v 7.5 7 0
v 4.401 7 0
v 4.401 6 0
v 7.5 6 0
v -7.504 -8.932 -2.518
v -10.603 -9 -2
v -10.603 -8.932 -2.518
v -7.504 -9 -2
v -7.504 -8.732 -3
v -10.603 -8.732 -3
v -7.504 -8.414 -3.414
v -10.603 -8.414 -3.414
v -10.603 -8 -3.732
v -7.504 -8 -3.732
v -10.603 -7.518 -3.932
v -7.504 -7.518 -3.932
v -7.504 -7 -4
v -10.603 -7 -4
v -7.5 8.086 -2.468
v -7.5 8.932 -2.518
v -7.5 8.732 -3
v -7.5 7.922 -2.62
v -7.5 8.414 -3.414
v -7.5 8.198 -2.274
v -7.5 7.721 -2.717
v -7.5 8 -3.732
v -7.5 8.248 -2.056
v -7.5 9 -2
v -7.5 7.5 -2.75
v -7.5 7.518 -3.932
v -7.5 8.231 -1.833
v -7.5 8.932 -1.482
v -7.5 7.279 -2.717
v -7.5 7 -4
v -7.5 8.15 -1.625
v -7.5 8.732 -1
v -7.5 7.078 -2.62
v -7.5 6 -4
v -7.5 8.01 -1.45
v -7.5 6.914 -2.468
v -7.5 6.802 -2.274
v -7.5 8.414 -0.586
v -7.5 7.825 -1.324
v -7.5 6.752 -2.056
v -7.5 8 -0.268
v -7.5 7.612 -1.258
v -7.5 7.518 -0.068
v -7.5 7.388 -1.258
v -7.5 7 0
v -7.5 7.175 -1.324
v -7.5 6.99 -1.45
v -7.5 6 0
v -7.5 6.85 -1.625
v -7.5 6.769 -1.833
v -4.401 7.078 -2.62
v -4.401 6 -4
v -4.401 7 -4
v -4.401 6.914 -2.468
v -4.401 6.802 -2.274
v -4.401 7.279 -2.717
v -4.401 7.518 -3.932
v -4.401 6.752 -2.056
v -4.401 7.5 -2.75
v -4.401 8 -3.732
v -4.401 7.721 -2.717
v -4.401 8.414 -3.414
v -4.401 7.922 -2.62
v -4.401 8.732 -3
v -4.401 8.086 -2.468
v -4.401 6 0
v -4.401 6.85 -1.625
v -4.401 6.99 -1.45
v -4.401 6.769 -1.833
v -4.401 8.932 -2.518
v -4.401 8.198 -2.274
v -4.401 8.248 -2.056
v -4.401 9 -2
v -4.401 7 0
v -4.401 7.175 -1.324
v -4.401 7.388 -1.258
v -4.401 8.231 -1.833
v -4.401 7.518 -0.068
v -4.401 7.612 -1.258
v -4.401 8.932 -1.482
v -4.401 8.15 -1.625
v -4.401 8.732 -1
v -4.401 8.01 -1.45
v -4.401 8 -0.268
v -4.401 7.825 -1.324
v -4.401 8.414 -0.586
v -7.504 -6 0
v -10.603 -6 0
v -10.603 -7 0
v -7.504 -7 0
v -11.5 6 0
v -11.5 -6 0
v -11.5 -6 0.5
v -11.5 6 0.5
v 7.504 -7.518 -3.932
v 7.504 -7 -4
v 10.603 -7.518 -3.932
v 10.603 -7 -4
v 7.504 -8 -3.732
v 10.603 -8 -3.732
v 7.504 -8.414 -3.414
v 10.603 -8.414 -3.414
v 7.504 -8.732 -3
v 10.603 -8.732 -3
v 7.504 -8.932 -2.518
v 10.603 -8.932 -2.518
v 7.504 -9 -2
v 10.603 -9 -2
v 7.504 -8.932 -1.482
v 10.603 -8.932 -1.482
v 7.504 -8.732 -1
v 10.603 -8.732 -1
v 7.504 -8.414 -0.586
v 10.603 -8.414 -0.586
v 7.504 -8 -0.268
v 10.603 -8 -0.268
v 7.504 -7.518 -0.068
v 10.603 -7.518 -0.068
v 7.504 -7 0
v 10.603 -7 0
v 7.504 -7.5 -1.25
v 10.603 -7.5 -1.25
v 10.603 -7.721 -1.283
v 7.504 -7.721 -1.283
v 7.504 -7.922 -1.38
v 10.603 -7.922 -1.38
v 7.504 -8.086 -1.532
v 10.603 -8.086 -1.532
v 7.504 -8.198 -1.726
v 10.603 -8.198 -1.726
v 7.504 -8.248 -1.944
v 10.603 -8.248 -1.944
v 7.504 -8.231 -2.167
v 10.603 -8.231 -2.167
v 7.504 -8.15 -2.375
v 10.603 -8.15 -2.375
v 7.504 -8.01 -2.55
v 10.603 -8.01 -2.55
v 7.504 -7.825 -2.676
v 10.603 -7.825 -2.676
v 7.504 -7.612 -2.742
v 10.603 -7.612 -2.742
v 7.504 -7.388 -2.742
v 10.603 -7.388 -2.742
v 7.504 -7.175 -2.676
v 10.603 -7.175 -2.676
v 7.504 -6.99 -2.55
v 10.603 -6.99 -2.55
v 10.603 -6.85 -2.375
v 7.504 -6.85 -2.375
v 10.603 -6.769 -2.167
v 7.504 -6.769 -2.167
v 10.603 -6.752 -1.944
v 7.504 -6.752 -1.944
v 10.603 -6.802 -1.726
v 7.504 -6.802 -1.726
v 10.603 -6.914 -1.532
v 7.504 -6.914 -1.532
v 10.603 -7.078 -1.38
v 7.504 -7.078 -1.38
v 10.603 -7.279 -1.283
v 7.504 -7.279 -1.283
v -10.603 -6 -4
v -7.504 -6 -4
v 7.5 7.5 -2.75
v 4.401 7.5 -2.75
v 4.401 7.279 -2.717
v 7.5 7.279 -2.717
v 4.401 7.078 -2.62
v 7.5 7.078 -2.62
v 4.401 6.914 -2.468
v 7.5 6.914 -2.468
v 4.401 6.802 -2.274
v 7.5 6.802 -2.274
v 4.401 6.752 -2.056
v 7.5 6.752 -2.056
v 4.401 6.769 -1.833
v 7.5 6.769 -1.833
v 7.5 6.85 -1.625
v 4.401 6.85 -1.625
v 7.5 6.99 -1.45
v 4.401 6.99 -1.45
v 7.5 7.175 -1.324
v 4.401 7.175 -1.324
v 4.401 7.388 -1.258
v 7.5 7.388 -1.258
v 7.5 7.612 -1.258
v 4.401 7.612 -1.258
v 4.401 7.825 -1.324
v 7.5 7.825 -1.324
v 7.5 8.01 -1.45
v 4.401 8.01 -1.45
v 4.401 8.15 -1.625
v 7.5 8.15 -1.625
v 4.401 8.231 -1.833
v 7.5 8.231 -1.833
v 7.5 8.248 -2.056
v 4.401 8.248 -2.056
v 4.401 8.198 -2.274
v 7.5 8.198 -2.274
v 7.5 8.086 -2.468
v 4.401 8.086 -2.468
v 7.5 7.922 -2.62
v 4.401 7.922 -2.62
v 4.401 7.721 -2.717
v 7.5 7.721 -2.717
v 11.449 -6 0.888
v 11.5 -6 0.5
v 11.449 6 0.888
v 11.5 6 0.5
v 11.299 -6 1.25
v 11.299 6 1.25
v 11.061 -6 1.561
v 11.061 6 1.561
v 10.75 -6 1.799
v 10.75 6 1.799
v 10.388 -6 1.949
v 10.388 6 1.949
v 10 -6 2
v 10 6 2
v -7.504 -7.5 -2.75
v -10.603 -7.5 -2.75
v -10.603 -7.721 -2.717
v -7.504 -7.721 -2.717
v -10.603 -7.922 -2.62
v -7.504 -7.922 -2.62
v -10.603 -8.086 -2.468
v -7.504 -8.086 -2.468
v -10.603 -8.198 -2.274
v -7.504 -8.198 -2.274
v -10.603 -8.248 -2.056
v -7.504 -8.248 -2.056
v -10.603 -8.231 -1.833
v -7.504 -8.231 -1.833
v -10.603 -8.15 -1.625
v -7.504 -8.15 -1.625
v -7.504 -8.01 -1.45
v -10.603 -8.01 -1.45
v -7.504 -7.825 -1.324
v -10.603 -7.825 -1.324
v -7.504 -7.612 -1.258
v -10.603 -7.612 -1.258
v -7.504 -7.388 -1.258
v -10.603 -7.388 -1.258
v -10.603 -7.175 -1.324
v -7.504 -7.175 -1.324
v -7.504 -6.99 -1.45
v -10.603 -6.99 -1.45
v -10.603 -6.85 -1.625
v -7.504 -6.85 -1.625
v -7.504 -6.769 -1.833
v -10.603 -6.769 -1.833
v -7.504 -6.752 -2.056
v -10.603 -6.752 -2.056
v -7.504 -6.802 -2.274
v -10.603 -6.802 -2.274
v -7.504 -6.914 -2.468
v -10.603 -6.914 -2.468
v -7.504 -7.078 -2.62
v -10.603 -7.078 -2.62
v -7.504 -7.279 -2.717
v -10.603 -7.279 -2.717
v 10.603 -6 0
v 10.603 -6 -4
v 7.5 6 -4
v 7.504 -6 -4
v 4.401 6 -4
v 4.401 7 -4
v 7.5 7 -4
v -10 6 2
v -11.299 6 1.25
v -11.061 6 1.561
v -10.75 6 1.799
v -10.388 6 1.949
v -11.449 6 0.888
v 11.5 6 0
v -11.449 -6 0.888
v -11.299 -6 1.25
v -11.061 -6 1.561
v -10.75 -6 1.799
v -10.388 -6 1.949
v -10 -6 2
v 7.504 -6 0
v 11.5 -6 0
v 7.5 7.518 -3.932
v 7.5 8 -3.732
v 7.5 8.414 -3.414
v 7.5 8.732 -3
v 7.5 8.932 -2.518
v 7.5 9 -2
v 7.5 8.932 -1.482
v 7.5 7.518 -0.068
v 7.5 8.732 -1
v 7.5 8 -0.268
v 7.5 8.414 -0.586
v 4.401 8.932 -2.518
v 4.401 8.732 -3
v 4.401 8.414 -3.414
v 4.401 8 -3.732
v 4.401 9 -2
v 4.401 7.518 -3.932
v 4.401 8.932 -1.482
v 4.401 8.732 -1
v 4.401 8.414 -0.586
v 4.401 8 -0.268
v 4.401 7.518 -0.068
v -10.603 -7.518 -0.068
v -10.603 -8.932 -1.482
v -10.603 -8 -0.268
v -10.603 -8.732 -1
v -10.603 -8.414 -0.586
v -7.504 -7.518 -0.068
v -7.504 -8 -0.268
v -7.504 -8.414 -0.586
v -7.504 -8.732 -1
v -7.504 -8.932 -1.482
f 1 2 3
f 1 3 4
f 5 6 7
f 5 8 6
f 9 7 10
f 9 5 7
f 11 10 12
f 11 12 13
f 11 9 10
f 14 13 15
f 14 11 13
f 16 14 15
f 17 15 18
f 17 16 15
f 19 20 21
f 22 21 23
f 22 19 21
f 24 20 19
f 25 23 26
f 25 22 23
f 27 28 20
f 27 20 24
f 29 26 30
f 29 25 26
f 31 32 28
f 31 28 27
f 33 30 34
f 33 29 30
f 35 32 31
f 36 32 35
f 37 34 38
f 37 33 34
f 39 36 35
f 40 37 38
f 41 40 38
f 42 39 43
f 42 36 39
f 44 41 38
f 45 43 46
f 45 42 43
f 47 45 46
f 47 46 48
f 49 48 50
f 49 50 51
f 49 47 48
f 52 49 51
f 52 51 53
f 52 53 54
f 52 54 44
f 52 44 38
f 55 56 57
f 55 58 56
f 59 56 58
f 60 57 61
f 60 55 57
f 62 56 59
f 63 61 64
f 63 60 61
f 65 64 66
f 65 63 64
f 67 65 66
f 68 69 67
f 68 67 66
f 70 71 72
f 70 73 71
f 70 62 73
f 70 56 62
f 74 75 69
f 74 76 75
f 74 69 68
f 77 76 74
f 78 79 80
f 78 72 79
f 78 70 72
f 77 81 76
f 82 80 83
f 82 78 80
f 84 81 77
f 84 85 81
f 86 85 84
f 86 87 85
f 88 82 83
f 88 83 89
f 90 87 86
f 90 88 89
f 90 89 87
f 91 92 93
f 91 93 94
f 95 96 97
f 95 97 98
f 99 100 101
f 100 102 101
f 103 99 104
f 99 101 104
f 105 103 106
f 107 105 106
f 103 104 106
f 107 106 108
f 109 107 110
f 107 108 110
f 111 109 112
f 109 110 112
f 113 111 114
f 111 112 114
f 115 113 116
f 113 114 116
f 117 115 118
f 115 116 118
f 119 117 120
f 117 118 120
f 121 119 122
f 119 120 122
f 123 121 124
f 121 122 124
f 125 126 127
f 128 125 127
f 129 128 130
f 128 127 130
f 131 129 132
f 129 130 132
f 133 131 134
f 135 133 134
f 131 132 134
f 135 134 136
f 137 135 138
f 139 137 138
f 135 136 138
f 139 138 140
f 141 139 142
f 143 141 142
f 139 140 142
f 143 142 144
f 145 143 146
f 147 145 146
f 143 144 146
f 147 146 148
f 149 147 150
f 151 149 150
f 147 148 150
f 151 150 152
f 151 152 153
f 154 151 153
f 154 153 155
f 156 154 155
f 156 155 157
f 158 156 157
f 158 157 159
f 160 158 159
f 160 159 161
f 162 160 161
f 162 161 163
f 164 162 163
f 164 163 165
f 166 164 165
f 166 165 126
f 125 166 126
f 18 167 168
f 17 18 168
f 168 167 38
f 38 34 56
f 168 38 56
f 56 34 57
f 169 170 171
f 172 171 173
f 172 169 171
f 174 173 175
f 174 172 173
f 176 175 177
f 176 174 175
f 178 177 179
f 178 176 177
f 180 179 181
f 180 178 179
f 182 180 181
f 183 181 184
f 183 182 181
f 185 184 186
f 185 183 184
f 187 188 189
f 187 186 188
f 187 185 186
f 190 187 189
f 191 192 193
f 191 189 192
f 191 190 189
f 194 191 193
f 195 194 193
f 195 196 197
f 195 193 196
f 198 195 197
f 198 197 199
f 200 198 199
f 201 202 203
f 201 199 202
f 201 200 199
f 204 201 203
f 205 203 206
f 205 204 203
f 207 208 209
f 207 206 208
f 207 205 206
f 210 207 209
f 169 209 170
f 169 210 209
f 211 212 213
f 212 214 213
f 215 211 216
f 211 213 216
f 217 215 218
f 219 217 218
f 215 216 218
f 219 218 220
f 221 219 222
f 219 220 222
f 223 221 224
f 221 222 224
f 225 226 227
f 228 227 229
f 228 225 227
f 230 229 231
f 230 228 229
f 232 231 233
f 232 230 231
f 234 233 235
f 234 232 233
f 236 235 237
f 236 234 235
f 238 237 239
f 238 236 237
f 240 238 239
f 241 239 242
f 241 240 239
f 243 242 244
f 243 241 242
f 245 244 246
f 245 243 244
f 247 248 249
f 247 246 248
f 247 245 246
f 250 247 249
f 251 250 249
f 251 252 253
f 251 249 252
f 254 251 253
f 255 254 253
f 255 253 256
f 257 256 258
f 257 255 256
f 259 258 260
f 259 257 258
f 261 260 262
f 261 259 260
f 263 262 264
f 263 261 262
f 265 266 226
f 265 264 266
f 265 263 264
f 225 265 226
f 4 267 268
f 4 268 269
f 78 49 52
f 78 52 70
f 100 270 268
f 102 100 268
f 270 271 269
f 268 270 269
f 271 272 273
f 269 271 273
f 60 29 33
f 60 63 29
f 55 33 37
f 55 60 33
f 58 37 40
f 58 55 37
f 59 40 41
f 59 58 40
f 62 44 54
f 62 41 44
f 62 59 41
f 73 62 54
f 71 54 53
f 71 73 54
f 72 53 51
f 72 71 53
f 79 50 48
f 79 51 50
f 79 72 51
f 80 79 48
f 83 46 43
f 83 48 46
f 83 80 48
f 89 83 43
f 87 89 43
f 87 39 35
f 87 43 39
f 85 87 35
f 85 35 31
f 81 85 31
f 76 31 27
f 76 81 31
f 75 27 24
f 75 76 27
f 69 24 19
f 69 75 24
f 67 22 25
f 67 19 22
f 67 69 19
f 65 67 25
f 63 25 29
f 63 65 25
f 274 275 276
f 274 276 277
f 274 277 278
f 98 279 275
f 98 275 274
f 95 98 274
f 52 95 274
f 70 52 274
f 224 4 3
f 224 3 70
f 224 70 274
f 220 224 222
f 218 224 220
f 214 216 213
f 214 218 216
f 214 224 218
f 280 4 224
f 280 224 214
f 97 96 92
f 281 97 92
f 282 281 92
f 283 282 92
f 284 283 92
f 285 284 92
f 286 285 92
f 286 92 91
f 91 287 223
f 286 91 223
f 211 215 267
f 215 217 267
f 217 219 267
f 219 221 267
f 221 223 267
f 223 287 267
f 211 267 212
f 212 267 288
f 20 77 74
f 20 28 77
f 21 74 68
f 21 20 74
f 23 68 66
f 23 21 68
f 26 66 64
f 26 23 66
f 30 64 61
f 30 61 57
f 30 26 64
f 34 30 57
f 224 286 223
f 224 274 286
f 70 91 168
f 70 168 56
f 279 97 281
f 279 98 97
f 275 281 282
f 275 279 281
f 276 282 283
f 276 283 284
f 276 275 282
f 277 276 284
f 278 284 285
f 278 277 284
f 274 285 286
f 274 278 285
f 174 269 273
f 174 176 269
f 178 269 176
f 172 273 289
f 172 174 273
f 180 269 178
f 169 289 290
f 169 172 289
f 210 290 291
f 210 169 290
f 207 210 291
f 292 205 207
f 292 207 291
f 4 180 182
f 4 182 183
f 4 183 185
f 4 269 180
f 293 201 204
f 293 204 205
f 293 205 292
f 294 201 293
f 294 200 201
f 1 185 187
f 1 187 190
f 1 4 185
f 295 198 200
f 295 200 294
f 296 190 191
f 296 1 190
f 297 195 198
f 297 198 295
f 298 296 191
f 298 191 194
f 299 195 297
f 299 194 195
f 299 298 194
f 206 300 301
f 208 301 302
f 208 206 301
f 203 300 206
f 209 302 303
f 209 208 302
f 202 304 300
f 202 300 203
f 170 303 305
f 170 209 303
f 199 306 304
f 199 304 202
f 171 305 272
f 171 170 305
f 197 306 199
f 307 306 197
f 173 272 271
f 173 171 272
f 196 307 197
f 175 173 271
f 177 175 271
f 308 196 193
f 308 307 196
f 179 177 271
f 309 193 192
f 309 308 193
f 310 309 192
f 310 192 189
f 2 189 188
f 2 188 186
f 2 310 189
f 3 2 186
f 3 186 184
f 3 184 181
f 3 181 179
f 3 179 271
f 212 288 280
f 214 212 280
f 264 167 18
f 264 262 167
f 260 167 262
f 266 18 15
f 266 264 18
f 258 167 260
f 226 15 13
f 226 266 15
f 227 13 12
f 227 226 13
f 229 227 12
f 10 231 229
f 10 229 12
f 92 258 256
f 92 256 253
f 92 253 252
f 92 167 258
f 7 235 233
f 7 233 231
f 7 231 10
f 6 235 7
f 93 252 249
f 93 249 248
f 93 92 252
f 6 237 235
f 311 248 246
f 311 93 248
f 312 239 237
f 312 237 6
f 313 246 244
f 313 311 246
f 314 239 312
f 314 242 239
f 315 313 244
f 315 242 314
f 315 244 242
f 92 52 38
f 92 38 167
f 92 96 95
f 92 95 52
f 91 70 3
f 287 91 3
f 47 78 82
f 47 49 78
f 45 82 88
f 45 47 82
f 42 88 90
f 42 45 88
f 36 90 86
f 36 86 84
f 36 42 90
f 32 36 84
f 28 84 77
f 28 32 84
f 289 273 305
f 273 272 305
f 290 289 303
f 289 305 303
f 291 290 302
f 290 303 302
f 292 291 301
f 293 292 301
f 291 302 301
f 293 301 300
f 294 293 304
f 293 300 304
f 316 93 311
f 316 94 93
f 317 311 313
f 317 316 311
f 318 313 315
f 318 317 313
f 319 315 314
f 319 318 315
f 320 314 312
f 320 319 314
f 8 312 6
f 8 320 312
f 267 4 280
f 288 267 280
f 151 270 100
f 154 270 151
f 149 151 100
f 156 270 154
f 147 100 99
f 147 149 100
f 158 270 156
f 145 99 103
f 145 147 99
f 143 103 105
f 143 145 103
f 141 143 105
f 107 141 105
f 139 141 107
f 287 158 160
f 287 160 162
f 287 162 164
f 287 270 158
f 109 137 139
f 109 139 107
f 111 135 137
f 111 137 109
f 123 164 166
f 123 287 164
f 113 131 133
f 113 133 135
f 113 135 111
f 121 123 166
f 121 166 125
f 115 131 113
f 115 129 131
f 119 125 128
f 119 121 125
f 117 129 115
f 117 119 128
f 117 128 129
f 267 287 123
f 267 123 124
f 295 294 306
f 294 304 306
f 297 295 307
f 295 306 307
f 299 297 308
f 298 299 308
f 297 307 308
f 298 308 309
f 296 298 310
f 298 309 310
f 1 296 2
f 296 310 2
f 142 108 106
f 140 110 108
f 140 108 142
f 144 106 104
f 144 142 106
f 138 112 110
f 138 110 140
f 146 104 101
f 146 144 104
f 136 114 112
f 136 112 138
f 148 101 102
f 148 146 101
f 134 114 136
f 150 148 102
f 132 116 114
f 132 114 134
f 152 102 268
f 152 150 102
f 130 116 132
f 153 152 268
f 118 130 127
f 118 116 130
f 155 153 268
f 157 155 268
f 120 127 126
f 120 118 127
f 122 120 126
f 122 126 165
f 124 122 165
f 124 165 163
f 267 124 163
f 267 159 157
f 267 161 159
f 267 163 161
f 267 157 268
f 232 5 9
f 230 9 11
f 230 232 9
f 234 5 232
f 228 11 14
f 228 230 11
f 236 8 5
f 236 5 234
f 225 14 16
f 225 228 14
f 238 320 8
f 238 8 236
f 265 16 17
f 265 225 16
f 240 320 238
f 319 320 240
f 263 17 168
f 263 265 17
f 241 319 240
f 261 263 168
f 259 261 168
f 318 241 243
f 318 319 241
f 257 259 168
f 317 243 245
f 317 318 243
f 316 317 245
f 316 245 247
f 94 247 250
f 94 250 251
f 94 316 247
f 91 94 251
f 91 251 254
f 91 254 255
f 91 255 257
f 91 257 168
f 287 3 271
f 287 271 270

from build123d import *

# Parameters (mm, degrees)
SKETCH2_W                      = 23
SKETCH2_H                      = 12
BOSS_EXTRUDE2_DEPTH            = 2
FILLET3_R                      = 1.5
BOSS_EXTRUDE4_DEPTH            = 4
FILLET4_R                      = 2
F_1_5MM_DOWEL_HOLE1_AT_2_COUNT = 2
F_1_5MM_DOWEL_HOLE1_AT_2_PITCH = 15
F_1_5MM_DOWEL_HOLE2_D          = 1.5
F_1_5MM_DOWEL_HOLE2_DEPTH      = 29999.549354536
F_1_5MM_DOWEL_HOLE2_TIP        = 0.450645464


with BuildPart() as part:
    # Sketch2 → Boss-Extrude2 (new body)
    with BuildSketch(Plane.XY):
        Rectangle(SKETCH2_W, SKETCH2_H)
    extrude(amount=BOSS_EXTRUDE2_DEPTH)

    # Fillet3
    fillet3_edges = [part.edges().sort_by_distance(p)[0] for p in [
        (-11.5, 0, 2),
        (11.5, 0, 2),
    ]]
    fillet(fillet3_edges, radius=FILLET3_R)

    # Sketch3 → Boss-Extrude4 (add)
    with BuildSketch(Plane(origin=(0, 0, 0), x_dir=(-1, 0, 0), z_dir=(0, 0, -1))):
        Polygon((-10.602604408, -6), (-7.5, 6), (-7.5, 9), (-4.401349547, 9), (-4.401349547, 6), (-7.503953954, -6), (-7.503953954, -9), (-10.602604408, -9), align=None)
        Polygon((7.503953954, -6), (4.401349547, 6), (4.401349547, 9), (7.5, 9), (7.5, 6), (10.602604408, -6), (10.602604408, -9), (7.503953954, -9), align=None)
    extrude(amount=BOSS_EXTRUDE4_DEPTH)

    # Fillet4
    fillet4_edges = [part.edges().sort_by_distance(p)[0] for p in [
        (-9.053279181, -9, 0),
        (-9.053279181, -9, -4),
        (9.053279181, -9, 0),
        (9.053279181, -9, -4),
        (5.950674773, 9, 0),
        (5.950674773, 9, -4),
        (-5.950674773, 9, 0),
        (-5.950674773, 9, -4),
    ]]
    fillet(fillet4_edges, radius=FILLET4_R - 0.0001)  # a hair under: the kernel refuses the full size

    # Sketch9 → Ø1.5mm Dowel Hole1 (revolve, cut)
    with BuildSketch(Plane(origin=(7.5, 7.5, -2), x_dir=(0, 0, -1), z_dir=(0, 1, 0))):
        Polygon((0, 0), (0, 30000), (0.75, 29999.549354536), (0.75, 0), align=None)
    f_1_5mm_dowel_hole1 = revolve(axis=Axis((13.85, 7.5, -2), (-1, 0, 0)), mode=Mode.SUBTRACT)

    # Ø1.5mm Dowel Hole1 at 2: Ø1.5mm Dowel Hole1 ×2
    with Locations(*[(0, -i * F_1_5MM_DOWEL_HOLE1_AT_2_PITCH, 0) for i in range(1, F_1_5MM_DOWEL_HOLE1_AT_2_COUNT)]):
        add(f_1_5mm_dowel_hole1, mode=Mode.SUBTRACT)

    # Ø1.5mm Dowel Hole2
    with Locations(Plane(origin=(7.5, -7.5, -2), x_dir=(0, 0, -1), z_dir=(-1, 0, 0))):
        with Locations((0, 0)):
            Hole(F_1_5MM_DOWEL_HOLE2_D / 2, depth=F_1_5MM_DOWEL_HOLE2_DEPTH)
            with Locations((0, 0, -(F_1_5MM_DOWEL_HOLE2_DEPTH + F_1_5MM_DOWEL_HOLE2_TIP / 2))):  # 118° drill point
                Cone(0, F_1_5MM_DOWEL_HOLE2_D / 2, F_1_5MM_DOWEL_HOLE2_TIP, mode=Mode.SUBTRACT)


solid = part.part
